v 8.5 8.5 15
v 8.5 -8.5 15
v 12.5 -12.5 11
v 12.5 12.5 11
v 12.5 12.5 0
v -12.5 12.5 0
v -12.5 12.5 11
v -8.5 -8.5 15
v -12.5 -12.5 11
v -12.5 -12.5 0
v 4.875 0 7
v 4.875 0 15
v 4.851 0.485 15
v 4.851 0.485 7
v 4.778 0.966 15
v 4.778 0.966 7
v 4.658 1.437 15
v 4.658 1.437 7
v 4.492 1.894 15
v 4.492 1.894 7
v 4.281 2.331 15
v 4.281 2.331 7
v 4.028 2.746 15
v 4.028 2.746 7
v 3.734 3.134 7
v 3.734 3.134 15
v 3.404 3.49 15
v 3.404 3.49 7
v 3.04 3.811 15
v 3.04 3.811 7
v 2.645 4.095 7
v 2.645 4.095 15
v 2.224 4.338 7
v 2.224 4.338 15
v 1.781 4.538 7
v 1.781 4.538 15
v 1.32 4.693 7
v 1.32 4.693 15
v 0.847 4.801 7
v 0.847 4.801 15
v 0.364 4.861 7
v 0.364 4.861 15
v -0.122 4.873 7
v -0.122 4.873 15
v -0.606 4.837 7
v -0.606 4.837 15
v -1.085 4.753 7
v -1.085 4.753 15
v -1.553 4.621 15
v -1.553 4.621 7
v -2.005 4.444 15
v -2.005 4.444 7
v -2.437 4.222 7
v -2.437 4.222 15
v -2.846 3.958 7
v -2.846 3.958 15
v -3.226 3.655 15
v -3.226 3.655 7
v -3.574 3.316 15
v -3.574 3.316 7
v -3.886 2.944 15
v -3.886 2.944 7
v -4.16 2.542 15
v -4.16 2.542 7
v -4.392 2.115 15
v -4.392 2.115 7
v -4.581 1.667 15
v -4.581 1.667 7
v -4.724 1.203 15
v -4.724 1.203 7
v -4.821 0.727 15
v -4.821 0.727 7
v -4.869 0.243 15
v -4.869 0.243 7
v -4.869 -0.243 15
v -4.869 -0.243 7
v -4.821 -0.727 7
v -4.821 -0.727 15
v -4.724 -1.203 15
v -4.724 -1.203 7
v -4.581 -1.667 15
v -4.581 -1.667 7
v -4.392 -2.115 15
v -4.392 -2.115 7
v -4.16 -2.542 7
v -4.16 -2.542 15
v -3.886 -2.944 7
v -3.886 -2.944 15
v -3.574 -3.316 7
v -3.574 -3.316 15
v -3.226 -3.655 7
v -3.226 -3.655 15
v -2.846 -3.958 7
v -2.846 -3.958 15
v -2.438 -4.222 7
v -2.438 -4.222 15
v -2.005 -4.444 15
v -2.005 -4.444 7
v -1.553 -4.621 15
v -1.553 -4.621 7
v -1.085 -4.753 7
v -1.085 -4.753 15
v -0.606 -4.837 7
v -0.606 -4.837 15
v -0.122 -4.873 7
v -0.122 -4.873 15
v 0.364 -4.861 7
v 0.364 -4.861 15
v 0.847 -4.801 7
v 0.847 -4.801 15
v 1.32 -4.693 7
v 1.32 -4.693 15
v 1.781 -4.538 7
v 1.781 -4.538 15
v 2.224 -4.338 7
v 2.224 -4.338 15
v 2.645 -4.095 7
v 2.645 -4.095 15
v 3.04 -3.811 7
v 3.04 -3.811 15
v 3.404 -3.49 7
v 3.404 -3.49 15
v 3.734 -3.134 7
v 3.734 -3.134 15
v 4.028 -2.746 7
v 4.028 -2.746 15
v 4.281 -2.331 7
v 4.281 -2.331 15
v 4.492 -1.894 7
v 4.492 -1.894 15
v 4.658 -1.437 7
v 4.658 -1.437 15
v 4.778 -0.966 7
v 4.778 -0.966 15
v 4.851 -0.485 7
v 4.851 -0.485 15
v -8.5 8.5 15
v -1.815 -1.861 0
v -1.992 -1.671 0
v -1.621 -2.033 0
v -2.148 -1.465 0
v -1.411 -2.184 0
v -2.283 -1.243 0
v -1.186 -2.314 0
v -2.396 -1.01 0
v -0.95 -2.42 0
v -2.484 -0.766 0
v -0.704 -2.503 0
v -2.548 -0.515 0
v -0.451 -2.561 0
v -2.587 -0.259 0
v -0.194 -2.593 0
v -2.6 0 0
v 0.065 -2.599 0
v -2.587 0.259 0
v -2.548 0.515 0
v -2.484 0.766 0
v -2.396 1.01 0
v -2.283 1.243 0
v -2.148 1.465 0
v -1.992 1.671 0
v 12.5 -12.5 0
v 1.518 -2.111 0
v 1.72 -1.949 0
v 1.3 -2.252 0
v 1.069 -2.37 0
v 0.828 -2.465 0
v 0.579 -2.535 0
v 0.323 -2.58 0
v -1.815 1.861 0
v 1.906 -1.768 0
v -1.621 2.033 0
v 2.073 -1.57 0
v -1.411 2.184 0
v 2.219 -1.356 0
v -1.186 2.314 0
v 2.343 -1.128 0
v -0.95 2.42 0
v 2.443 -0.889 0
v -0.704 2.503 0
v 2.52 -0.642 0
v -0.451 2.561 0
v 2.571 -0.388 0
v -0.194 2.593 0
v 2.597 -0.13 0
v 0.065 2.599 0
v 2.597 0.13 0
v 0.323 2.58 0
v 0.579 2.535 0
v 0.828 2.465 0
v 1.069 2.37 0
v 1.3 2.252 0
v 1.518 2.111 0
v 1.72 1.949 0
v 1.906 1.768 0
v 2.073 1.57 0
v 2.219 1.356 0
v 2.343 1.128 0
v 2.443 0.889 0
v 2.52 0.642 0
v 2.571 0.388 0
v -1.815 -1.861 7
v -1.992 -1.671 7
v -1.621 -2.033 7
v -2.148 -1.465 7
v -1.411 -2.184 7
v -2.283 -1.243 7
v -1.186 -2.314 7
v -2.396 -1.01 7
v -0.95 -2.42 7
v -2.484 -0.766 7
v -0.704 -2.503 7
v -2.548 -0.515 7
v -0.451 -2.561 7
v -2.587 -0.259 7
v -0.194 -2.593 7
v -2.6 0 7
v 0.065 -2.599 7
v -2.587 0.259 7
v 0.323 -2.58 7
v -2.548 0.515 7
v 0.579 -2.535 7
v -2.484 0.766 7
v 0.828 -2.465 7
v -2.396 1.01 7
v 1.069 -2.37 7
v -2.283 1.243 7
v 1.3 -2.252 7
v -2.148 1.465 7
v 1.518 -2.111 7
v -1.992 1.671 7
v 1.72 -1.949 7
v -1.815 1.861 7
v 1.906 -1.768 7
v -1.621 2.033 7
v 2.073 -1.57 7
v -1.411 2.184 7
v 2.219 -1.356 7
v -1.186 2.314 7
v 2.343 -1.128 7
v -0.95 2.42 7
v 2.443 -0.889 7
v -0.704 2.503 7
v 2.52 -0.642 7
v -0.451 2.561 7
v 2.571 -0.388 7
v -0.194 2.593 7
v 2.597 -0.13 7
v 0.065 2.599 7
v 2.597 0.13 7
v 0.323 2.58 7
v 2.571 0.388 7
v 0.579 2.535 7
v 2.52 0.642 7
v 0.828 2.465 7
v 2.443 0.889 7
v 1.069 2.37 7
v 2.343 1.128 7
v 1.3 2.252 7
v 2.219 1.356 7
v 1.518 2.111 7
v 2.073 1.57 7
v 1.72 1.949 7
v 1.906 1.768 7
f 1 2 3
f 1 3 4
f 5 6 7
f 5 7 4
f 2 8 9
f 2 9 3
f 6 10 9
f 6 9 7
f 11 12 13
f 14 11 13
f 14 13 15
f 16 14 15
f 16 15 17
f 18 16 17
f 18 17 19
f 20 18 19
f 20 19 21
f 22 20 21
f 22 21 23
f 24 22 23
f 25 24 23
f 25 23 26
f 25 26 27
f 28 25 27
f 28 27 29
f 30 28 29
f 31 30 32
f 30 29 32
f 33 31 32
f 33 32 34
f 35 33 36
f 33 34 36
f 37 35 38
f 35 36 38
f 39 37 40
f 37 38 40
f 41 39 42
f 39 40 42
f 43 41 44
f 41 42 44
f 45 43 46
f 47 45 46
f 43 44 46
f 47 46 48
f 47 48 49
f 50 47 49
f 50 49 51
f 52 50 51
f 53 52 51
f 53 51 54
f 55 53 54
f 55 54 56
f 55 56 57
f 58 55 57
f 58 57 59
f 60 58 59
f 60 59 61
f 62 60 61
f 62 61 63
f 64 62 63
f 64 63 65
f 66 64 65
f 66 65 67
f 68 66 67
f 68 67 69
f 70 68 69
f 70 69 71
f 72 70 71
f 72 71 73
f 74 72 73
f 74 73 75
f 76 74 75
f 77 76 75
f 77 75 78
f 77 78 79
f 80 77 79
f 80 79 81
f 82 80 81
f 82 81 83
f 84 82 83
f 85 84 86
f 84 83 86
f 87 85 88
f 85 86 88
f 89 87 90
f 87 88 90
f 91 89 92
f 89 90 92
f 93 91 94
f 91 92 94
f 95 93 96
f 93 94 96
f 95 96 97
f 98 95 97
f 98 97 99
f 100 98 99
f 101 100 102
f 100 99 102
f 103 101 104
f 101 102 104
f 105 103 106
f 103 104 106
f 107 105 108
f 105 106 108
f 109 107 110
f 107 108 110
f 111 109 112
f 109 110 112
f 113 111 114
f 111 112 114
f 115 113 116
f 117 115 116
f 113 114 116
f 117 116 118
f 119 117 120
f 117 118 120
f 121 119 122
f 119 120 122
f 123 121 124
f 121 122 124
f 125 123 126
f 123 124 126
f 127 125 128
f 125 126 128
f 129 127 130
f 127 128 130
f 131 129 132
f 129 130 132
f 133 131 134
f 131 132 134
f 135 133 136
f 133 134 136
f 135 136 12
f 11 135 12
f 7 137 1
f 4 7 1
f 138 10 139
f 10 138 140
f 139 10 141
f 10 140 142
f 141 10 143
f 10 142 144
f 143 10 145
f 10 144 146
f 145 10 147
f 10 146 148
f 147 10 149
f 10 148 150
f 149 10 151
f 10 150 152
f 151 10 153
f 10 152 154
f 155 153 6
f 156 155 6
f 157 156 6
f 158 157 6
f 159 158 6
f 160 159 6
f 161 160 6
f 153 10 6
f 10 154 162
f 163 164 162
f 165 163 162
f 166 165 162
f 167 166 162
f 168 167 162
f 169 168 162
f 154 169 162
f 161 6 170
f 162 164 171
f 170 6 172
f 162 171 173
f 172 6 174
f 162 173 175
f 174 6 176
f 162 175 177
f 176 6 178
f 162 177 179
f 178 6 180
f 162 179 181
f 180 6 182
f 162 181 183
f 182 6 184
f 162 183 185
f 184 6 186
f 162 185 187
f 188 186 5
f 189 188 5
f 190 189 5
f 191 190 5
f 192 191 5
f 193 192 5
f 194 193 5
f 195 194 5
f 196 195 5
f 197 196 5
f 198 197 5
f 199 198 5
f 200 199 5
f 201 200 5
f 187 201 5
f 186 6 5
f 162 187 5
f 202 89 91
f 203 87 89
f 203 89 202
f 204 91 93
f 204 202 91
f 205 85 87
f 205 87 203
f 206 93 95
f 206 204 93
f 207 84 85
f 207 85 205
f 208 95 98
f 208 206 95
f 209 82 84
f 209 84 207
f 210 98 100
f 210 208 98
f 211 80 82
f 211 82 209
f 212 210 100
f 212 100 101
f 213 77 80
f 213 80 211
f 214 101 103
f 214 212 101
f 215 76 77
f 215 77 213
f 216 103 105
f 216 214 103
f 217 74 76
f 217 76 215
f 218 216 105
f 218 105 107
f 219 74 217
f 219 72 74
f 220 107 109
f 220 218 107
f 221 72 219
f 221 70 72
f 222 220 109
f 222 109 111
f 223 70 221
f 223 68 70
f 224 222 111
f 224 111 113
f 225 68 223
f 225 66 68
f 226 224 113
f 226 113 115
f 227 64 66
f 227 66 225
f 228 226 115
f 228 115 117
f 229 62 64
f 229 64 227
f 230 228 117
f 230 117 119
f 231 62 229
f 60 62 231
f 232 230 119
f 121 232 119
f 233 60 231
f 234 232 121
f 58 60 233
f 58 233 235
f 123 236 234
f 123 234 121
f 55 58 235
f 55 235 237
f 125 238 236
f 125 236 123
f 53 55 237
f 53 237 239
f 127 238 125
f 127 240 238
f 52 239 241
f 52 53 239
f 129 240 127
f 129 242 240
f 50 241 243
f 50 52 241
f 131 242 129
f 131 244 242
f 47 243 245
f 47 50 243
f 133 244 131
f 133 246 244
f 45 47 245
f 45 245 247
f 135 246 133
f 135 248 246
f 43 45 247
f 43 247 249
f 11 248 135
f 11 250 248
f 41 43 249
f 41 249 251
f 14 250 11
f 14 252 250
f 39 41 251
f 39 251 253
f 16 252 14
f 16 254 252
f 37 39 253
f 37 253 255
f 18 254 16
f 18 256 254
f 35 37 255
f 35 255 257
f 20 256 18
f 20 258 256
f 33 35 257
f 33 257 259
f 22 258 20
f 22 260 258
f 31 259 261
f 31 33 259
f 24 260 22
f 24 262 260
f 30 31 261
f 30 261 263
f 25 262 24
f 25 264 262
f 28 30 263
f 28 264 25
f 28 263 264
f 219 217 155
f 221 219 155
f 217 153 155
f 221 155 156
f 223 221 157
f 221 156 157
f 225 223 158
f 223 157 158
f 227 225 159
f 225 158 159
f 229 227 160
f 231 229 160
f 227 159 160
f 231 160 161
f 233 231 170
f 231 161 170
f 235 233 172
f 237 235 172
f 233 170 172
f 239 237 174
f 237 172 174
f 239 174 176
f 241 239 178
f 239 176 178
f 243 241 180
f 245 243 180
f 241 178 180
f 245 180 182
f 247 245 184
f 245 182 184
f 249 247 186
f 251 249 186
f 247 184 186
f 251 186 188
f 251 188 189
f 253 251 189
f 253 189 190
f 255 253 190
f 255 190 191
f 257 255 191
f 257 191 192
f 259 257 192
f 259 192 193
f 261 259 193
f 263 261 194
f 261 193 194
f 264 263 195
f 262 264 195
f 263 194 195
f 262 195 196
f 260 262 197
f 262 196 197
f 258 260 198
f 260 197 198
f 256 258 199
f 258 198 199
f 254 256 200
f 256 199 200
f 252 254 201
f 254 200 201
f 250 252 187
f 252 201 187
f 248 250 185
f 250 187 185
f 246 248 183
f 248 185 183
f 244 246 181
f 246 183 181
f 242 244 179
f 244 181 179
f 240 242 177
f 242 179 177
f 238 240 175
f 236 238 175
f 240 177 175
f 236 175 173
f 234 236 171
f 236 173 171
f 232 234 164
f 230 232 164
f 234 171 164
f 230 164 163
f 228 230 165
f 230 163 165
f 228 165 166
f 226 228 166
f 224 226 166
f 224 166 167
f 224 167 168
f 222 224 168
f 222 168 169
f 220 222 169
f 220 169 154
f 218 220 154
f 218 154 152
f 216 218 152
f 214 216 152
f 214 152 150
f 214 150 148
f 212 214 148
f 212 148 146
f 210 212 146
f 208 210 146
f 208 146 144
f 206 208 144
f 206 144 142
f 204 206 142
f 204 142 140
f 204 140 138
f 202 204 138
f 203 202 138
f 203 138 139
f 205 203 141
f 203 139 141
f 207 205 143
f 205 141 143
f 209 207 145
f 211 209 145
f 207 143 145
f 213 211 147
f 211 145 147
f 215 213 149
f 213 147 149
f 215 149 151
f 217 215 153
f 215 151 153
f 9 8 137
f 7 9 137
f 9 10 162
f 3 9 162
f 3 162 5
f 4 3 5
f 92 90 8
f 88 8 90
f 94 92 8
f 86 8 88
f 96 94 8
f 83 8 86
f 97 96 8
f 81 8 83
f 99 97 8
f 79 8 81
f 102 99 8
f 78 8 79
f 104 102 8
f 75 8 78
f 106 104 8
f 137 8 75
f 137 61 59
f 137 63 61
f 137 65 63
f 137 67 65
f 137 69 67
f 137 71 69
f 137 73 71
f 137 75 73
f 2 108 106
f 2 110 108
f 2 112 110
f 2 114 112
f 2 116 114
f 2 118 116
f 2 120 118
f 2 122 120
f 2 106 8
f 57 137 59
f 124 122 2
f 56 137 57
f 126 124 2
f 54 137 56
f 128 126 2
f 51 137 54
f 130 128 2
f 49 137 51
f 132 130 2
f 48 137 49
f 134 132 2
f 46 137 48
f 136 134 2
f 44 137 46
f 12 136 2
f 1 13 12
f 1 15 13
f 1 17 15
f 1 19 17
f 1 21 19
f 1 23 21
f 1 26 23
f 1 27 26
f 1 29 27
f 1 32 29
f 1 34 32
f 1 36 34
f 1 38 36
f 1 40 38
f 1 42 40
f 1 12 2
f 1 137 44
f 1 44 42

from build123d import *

# Parameters (mm, degrees)
F0_W           = 25
F0_H           = 25
F1_DEPTH       = 15
F2_SIZE        = 4
F4_D           = 5.2
F4_CBORE_D     = 9.75
F4_CBORE_DEPTH = 8


with BuildPart() as f1:
    # F0 (on Top) → F1 (new body)
    with BuildSketch(Plane.XY):
        Rectangle(F0_W, F0_H)
    extrude(amount=F1_DEPTH)

    # F2
    f2_edges = [f1.edges().sort_by_distance(p)[0] for p in [
        (-12.5, 0, 15),
        (0, 12.5, 15),
        (12.5, 0, 15),
        (0, -12.5, 15),
    ]]
    chamfer(f2_edges, length=F2_SIZE)

    # F4 (through all)
    with Locations(Plane.XY.offset(15)):
        with Locations((0, 0)):
            CounterBoreHole(F4_D / 2, F4_CBORE_D / 2, F4_CBORE_DEPTH)


solid = f1.part
